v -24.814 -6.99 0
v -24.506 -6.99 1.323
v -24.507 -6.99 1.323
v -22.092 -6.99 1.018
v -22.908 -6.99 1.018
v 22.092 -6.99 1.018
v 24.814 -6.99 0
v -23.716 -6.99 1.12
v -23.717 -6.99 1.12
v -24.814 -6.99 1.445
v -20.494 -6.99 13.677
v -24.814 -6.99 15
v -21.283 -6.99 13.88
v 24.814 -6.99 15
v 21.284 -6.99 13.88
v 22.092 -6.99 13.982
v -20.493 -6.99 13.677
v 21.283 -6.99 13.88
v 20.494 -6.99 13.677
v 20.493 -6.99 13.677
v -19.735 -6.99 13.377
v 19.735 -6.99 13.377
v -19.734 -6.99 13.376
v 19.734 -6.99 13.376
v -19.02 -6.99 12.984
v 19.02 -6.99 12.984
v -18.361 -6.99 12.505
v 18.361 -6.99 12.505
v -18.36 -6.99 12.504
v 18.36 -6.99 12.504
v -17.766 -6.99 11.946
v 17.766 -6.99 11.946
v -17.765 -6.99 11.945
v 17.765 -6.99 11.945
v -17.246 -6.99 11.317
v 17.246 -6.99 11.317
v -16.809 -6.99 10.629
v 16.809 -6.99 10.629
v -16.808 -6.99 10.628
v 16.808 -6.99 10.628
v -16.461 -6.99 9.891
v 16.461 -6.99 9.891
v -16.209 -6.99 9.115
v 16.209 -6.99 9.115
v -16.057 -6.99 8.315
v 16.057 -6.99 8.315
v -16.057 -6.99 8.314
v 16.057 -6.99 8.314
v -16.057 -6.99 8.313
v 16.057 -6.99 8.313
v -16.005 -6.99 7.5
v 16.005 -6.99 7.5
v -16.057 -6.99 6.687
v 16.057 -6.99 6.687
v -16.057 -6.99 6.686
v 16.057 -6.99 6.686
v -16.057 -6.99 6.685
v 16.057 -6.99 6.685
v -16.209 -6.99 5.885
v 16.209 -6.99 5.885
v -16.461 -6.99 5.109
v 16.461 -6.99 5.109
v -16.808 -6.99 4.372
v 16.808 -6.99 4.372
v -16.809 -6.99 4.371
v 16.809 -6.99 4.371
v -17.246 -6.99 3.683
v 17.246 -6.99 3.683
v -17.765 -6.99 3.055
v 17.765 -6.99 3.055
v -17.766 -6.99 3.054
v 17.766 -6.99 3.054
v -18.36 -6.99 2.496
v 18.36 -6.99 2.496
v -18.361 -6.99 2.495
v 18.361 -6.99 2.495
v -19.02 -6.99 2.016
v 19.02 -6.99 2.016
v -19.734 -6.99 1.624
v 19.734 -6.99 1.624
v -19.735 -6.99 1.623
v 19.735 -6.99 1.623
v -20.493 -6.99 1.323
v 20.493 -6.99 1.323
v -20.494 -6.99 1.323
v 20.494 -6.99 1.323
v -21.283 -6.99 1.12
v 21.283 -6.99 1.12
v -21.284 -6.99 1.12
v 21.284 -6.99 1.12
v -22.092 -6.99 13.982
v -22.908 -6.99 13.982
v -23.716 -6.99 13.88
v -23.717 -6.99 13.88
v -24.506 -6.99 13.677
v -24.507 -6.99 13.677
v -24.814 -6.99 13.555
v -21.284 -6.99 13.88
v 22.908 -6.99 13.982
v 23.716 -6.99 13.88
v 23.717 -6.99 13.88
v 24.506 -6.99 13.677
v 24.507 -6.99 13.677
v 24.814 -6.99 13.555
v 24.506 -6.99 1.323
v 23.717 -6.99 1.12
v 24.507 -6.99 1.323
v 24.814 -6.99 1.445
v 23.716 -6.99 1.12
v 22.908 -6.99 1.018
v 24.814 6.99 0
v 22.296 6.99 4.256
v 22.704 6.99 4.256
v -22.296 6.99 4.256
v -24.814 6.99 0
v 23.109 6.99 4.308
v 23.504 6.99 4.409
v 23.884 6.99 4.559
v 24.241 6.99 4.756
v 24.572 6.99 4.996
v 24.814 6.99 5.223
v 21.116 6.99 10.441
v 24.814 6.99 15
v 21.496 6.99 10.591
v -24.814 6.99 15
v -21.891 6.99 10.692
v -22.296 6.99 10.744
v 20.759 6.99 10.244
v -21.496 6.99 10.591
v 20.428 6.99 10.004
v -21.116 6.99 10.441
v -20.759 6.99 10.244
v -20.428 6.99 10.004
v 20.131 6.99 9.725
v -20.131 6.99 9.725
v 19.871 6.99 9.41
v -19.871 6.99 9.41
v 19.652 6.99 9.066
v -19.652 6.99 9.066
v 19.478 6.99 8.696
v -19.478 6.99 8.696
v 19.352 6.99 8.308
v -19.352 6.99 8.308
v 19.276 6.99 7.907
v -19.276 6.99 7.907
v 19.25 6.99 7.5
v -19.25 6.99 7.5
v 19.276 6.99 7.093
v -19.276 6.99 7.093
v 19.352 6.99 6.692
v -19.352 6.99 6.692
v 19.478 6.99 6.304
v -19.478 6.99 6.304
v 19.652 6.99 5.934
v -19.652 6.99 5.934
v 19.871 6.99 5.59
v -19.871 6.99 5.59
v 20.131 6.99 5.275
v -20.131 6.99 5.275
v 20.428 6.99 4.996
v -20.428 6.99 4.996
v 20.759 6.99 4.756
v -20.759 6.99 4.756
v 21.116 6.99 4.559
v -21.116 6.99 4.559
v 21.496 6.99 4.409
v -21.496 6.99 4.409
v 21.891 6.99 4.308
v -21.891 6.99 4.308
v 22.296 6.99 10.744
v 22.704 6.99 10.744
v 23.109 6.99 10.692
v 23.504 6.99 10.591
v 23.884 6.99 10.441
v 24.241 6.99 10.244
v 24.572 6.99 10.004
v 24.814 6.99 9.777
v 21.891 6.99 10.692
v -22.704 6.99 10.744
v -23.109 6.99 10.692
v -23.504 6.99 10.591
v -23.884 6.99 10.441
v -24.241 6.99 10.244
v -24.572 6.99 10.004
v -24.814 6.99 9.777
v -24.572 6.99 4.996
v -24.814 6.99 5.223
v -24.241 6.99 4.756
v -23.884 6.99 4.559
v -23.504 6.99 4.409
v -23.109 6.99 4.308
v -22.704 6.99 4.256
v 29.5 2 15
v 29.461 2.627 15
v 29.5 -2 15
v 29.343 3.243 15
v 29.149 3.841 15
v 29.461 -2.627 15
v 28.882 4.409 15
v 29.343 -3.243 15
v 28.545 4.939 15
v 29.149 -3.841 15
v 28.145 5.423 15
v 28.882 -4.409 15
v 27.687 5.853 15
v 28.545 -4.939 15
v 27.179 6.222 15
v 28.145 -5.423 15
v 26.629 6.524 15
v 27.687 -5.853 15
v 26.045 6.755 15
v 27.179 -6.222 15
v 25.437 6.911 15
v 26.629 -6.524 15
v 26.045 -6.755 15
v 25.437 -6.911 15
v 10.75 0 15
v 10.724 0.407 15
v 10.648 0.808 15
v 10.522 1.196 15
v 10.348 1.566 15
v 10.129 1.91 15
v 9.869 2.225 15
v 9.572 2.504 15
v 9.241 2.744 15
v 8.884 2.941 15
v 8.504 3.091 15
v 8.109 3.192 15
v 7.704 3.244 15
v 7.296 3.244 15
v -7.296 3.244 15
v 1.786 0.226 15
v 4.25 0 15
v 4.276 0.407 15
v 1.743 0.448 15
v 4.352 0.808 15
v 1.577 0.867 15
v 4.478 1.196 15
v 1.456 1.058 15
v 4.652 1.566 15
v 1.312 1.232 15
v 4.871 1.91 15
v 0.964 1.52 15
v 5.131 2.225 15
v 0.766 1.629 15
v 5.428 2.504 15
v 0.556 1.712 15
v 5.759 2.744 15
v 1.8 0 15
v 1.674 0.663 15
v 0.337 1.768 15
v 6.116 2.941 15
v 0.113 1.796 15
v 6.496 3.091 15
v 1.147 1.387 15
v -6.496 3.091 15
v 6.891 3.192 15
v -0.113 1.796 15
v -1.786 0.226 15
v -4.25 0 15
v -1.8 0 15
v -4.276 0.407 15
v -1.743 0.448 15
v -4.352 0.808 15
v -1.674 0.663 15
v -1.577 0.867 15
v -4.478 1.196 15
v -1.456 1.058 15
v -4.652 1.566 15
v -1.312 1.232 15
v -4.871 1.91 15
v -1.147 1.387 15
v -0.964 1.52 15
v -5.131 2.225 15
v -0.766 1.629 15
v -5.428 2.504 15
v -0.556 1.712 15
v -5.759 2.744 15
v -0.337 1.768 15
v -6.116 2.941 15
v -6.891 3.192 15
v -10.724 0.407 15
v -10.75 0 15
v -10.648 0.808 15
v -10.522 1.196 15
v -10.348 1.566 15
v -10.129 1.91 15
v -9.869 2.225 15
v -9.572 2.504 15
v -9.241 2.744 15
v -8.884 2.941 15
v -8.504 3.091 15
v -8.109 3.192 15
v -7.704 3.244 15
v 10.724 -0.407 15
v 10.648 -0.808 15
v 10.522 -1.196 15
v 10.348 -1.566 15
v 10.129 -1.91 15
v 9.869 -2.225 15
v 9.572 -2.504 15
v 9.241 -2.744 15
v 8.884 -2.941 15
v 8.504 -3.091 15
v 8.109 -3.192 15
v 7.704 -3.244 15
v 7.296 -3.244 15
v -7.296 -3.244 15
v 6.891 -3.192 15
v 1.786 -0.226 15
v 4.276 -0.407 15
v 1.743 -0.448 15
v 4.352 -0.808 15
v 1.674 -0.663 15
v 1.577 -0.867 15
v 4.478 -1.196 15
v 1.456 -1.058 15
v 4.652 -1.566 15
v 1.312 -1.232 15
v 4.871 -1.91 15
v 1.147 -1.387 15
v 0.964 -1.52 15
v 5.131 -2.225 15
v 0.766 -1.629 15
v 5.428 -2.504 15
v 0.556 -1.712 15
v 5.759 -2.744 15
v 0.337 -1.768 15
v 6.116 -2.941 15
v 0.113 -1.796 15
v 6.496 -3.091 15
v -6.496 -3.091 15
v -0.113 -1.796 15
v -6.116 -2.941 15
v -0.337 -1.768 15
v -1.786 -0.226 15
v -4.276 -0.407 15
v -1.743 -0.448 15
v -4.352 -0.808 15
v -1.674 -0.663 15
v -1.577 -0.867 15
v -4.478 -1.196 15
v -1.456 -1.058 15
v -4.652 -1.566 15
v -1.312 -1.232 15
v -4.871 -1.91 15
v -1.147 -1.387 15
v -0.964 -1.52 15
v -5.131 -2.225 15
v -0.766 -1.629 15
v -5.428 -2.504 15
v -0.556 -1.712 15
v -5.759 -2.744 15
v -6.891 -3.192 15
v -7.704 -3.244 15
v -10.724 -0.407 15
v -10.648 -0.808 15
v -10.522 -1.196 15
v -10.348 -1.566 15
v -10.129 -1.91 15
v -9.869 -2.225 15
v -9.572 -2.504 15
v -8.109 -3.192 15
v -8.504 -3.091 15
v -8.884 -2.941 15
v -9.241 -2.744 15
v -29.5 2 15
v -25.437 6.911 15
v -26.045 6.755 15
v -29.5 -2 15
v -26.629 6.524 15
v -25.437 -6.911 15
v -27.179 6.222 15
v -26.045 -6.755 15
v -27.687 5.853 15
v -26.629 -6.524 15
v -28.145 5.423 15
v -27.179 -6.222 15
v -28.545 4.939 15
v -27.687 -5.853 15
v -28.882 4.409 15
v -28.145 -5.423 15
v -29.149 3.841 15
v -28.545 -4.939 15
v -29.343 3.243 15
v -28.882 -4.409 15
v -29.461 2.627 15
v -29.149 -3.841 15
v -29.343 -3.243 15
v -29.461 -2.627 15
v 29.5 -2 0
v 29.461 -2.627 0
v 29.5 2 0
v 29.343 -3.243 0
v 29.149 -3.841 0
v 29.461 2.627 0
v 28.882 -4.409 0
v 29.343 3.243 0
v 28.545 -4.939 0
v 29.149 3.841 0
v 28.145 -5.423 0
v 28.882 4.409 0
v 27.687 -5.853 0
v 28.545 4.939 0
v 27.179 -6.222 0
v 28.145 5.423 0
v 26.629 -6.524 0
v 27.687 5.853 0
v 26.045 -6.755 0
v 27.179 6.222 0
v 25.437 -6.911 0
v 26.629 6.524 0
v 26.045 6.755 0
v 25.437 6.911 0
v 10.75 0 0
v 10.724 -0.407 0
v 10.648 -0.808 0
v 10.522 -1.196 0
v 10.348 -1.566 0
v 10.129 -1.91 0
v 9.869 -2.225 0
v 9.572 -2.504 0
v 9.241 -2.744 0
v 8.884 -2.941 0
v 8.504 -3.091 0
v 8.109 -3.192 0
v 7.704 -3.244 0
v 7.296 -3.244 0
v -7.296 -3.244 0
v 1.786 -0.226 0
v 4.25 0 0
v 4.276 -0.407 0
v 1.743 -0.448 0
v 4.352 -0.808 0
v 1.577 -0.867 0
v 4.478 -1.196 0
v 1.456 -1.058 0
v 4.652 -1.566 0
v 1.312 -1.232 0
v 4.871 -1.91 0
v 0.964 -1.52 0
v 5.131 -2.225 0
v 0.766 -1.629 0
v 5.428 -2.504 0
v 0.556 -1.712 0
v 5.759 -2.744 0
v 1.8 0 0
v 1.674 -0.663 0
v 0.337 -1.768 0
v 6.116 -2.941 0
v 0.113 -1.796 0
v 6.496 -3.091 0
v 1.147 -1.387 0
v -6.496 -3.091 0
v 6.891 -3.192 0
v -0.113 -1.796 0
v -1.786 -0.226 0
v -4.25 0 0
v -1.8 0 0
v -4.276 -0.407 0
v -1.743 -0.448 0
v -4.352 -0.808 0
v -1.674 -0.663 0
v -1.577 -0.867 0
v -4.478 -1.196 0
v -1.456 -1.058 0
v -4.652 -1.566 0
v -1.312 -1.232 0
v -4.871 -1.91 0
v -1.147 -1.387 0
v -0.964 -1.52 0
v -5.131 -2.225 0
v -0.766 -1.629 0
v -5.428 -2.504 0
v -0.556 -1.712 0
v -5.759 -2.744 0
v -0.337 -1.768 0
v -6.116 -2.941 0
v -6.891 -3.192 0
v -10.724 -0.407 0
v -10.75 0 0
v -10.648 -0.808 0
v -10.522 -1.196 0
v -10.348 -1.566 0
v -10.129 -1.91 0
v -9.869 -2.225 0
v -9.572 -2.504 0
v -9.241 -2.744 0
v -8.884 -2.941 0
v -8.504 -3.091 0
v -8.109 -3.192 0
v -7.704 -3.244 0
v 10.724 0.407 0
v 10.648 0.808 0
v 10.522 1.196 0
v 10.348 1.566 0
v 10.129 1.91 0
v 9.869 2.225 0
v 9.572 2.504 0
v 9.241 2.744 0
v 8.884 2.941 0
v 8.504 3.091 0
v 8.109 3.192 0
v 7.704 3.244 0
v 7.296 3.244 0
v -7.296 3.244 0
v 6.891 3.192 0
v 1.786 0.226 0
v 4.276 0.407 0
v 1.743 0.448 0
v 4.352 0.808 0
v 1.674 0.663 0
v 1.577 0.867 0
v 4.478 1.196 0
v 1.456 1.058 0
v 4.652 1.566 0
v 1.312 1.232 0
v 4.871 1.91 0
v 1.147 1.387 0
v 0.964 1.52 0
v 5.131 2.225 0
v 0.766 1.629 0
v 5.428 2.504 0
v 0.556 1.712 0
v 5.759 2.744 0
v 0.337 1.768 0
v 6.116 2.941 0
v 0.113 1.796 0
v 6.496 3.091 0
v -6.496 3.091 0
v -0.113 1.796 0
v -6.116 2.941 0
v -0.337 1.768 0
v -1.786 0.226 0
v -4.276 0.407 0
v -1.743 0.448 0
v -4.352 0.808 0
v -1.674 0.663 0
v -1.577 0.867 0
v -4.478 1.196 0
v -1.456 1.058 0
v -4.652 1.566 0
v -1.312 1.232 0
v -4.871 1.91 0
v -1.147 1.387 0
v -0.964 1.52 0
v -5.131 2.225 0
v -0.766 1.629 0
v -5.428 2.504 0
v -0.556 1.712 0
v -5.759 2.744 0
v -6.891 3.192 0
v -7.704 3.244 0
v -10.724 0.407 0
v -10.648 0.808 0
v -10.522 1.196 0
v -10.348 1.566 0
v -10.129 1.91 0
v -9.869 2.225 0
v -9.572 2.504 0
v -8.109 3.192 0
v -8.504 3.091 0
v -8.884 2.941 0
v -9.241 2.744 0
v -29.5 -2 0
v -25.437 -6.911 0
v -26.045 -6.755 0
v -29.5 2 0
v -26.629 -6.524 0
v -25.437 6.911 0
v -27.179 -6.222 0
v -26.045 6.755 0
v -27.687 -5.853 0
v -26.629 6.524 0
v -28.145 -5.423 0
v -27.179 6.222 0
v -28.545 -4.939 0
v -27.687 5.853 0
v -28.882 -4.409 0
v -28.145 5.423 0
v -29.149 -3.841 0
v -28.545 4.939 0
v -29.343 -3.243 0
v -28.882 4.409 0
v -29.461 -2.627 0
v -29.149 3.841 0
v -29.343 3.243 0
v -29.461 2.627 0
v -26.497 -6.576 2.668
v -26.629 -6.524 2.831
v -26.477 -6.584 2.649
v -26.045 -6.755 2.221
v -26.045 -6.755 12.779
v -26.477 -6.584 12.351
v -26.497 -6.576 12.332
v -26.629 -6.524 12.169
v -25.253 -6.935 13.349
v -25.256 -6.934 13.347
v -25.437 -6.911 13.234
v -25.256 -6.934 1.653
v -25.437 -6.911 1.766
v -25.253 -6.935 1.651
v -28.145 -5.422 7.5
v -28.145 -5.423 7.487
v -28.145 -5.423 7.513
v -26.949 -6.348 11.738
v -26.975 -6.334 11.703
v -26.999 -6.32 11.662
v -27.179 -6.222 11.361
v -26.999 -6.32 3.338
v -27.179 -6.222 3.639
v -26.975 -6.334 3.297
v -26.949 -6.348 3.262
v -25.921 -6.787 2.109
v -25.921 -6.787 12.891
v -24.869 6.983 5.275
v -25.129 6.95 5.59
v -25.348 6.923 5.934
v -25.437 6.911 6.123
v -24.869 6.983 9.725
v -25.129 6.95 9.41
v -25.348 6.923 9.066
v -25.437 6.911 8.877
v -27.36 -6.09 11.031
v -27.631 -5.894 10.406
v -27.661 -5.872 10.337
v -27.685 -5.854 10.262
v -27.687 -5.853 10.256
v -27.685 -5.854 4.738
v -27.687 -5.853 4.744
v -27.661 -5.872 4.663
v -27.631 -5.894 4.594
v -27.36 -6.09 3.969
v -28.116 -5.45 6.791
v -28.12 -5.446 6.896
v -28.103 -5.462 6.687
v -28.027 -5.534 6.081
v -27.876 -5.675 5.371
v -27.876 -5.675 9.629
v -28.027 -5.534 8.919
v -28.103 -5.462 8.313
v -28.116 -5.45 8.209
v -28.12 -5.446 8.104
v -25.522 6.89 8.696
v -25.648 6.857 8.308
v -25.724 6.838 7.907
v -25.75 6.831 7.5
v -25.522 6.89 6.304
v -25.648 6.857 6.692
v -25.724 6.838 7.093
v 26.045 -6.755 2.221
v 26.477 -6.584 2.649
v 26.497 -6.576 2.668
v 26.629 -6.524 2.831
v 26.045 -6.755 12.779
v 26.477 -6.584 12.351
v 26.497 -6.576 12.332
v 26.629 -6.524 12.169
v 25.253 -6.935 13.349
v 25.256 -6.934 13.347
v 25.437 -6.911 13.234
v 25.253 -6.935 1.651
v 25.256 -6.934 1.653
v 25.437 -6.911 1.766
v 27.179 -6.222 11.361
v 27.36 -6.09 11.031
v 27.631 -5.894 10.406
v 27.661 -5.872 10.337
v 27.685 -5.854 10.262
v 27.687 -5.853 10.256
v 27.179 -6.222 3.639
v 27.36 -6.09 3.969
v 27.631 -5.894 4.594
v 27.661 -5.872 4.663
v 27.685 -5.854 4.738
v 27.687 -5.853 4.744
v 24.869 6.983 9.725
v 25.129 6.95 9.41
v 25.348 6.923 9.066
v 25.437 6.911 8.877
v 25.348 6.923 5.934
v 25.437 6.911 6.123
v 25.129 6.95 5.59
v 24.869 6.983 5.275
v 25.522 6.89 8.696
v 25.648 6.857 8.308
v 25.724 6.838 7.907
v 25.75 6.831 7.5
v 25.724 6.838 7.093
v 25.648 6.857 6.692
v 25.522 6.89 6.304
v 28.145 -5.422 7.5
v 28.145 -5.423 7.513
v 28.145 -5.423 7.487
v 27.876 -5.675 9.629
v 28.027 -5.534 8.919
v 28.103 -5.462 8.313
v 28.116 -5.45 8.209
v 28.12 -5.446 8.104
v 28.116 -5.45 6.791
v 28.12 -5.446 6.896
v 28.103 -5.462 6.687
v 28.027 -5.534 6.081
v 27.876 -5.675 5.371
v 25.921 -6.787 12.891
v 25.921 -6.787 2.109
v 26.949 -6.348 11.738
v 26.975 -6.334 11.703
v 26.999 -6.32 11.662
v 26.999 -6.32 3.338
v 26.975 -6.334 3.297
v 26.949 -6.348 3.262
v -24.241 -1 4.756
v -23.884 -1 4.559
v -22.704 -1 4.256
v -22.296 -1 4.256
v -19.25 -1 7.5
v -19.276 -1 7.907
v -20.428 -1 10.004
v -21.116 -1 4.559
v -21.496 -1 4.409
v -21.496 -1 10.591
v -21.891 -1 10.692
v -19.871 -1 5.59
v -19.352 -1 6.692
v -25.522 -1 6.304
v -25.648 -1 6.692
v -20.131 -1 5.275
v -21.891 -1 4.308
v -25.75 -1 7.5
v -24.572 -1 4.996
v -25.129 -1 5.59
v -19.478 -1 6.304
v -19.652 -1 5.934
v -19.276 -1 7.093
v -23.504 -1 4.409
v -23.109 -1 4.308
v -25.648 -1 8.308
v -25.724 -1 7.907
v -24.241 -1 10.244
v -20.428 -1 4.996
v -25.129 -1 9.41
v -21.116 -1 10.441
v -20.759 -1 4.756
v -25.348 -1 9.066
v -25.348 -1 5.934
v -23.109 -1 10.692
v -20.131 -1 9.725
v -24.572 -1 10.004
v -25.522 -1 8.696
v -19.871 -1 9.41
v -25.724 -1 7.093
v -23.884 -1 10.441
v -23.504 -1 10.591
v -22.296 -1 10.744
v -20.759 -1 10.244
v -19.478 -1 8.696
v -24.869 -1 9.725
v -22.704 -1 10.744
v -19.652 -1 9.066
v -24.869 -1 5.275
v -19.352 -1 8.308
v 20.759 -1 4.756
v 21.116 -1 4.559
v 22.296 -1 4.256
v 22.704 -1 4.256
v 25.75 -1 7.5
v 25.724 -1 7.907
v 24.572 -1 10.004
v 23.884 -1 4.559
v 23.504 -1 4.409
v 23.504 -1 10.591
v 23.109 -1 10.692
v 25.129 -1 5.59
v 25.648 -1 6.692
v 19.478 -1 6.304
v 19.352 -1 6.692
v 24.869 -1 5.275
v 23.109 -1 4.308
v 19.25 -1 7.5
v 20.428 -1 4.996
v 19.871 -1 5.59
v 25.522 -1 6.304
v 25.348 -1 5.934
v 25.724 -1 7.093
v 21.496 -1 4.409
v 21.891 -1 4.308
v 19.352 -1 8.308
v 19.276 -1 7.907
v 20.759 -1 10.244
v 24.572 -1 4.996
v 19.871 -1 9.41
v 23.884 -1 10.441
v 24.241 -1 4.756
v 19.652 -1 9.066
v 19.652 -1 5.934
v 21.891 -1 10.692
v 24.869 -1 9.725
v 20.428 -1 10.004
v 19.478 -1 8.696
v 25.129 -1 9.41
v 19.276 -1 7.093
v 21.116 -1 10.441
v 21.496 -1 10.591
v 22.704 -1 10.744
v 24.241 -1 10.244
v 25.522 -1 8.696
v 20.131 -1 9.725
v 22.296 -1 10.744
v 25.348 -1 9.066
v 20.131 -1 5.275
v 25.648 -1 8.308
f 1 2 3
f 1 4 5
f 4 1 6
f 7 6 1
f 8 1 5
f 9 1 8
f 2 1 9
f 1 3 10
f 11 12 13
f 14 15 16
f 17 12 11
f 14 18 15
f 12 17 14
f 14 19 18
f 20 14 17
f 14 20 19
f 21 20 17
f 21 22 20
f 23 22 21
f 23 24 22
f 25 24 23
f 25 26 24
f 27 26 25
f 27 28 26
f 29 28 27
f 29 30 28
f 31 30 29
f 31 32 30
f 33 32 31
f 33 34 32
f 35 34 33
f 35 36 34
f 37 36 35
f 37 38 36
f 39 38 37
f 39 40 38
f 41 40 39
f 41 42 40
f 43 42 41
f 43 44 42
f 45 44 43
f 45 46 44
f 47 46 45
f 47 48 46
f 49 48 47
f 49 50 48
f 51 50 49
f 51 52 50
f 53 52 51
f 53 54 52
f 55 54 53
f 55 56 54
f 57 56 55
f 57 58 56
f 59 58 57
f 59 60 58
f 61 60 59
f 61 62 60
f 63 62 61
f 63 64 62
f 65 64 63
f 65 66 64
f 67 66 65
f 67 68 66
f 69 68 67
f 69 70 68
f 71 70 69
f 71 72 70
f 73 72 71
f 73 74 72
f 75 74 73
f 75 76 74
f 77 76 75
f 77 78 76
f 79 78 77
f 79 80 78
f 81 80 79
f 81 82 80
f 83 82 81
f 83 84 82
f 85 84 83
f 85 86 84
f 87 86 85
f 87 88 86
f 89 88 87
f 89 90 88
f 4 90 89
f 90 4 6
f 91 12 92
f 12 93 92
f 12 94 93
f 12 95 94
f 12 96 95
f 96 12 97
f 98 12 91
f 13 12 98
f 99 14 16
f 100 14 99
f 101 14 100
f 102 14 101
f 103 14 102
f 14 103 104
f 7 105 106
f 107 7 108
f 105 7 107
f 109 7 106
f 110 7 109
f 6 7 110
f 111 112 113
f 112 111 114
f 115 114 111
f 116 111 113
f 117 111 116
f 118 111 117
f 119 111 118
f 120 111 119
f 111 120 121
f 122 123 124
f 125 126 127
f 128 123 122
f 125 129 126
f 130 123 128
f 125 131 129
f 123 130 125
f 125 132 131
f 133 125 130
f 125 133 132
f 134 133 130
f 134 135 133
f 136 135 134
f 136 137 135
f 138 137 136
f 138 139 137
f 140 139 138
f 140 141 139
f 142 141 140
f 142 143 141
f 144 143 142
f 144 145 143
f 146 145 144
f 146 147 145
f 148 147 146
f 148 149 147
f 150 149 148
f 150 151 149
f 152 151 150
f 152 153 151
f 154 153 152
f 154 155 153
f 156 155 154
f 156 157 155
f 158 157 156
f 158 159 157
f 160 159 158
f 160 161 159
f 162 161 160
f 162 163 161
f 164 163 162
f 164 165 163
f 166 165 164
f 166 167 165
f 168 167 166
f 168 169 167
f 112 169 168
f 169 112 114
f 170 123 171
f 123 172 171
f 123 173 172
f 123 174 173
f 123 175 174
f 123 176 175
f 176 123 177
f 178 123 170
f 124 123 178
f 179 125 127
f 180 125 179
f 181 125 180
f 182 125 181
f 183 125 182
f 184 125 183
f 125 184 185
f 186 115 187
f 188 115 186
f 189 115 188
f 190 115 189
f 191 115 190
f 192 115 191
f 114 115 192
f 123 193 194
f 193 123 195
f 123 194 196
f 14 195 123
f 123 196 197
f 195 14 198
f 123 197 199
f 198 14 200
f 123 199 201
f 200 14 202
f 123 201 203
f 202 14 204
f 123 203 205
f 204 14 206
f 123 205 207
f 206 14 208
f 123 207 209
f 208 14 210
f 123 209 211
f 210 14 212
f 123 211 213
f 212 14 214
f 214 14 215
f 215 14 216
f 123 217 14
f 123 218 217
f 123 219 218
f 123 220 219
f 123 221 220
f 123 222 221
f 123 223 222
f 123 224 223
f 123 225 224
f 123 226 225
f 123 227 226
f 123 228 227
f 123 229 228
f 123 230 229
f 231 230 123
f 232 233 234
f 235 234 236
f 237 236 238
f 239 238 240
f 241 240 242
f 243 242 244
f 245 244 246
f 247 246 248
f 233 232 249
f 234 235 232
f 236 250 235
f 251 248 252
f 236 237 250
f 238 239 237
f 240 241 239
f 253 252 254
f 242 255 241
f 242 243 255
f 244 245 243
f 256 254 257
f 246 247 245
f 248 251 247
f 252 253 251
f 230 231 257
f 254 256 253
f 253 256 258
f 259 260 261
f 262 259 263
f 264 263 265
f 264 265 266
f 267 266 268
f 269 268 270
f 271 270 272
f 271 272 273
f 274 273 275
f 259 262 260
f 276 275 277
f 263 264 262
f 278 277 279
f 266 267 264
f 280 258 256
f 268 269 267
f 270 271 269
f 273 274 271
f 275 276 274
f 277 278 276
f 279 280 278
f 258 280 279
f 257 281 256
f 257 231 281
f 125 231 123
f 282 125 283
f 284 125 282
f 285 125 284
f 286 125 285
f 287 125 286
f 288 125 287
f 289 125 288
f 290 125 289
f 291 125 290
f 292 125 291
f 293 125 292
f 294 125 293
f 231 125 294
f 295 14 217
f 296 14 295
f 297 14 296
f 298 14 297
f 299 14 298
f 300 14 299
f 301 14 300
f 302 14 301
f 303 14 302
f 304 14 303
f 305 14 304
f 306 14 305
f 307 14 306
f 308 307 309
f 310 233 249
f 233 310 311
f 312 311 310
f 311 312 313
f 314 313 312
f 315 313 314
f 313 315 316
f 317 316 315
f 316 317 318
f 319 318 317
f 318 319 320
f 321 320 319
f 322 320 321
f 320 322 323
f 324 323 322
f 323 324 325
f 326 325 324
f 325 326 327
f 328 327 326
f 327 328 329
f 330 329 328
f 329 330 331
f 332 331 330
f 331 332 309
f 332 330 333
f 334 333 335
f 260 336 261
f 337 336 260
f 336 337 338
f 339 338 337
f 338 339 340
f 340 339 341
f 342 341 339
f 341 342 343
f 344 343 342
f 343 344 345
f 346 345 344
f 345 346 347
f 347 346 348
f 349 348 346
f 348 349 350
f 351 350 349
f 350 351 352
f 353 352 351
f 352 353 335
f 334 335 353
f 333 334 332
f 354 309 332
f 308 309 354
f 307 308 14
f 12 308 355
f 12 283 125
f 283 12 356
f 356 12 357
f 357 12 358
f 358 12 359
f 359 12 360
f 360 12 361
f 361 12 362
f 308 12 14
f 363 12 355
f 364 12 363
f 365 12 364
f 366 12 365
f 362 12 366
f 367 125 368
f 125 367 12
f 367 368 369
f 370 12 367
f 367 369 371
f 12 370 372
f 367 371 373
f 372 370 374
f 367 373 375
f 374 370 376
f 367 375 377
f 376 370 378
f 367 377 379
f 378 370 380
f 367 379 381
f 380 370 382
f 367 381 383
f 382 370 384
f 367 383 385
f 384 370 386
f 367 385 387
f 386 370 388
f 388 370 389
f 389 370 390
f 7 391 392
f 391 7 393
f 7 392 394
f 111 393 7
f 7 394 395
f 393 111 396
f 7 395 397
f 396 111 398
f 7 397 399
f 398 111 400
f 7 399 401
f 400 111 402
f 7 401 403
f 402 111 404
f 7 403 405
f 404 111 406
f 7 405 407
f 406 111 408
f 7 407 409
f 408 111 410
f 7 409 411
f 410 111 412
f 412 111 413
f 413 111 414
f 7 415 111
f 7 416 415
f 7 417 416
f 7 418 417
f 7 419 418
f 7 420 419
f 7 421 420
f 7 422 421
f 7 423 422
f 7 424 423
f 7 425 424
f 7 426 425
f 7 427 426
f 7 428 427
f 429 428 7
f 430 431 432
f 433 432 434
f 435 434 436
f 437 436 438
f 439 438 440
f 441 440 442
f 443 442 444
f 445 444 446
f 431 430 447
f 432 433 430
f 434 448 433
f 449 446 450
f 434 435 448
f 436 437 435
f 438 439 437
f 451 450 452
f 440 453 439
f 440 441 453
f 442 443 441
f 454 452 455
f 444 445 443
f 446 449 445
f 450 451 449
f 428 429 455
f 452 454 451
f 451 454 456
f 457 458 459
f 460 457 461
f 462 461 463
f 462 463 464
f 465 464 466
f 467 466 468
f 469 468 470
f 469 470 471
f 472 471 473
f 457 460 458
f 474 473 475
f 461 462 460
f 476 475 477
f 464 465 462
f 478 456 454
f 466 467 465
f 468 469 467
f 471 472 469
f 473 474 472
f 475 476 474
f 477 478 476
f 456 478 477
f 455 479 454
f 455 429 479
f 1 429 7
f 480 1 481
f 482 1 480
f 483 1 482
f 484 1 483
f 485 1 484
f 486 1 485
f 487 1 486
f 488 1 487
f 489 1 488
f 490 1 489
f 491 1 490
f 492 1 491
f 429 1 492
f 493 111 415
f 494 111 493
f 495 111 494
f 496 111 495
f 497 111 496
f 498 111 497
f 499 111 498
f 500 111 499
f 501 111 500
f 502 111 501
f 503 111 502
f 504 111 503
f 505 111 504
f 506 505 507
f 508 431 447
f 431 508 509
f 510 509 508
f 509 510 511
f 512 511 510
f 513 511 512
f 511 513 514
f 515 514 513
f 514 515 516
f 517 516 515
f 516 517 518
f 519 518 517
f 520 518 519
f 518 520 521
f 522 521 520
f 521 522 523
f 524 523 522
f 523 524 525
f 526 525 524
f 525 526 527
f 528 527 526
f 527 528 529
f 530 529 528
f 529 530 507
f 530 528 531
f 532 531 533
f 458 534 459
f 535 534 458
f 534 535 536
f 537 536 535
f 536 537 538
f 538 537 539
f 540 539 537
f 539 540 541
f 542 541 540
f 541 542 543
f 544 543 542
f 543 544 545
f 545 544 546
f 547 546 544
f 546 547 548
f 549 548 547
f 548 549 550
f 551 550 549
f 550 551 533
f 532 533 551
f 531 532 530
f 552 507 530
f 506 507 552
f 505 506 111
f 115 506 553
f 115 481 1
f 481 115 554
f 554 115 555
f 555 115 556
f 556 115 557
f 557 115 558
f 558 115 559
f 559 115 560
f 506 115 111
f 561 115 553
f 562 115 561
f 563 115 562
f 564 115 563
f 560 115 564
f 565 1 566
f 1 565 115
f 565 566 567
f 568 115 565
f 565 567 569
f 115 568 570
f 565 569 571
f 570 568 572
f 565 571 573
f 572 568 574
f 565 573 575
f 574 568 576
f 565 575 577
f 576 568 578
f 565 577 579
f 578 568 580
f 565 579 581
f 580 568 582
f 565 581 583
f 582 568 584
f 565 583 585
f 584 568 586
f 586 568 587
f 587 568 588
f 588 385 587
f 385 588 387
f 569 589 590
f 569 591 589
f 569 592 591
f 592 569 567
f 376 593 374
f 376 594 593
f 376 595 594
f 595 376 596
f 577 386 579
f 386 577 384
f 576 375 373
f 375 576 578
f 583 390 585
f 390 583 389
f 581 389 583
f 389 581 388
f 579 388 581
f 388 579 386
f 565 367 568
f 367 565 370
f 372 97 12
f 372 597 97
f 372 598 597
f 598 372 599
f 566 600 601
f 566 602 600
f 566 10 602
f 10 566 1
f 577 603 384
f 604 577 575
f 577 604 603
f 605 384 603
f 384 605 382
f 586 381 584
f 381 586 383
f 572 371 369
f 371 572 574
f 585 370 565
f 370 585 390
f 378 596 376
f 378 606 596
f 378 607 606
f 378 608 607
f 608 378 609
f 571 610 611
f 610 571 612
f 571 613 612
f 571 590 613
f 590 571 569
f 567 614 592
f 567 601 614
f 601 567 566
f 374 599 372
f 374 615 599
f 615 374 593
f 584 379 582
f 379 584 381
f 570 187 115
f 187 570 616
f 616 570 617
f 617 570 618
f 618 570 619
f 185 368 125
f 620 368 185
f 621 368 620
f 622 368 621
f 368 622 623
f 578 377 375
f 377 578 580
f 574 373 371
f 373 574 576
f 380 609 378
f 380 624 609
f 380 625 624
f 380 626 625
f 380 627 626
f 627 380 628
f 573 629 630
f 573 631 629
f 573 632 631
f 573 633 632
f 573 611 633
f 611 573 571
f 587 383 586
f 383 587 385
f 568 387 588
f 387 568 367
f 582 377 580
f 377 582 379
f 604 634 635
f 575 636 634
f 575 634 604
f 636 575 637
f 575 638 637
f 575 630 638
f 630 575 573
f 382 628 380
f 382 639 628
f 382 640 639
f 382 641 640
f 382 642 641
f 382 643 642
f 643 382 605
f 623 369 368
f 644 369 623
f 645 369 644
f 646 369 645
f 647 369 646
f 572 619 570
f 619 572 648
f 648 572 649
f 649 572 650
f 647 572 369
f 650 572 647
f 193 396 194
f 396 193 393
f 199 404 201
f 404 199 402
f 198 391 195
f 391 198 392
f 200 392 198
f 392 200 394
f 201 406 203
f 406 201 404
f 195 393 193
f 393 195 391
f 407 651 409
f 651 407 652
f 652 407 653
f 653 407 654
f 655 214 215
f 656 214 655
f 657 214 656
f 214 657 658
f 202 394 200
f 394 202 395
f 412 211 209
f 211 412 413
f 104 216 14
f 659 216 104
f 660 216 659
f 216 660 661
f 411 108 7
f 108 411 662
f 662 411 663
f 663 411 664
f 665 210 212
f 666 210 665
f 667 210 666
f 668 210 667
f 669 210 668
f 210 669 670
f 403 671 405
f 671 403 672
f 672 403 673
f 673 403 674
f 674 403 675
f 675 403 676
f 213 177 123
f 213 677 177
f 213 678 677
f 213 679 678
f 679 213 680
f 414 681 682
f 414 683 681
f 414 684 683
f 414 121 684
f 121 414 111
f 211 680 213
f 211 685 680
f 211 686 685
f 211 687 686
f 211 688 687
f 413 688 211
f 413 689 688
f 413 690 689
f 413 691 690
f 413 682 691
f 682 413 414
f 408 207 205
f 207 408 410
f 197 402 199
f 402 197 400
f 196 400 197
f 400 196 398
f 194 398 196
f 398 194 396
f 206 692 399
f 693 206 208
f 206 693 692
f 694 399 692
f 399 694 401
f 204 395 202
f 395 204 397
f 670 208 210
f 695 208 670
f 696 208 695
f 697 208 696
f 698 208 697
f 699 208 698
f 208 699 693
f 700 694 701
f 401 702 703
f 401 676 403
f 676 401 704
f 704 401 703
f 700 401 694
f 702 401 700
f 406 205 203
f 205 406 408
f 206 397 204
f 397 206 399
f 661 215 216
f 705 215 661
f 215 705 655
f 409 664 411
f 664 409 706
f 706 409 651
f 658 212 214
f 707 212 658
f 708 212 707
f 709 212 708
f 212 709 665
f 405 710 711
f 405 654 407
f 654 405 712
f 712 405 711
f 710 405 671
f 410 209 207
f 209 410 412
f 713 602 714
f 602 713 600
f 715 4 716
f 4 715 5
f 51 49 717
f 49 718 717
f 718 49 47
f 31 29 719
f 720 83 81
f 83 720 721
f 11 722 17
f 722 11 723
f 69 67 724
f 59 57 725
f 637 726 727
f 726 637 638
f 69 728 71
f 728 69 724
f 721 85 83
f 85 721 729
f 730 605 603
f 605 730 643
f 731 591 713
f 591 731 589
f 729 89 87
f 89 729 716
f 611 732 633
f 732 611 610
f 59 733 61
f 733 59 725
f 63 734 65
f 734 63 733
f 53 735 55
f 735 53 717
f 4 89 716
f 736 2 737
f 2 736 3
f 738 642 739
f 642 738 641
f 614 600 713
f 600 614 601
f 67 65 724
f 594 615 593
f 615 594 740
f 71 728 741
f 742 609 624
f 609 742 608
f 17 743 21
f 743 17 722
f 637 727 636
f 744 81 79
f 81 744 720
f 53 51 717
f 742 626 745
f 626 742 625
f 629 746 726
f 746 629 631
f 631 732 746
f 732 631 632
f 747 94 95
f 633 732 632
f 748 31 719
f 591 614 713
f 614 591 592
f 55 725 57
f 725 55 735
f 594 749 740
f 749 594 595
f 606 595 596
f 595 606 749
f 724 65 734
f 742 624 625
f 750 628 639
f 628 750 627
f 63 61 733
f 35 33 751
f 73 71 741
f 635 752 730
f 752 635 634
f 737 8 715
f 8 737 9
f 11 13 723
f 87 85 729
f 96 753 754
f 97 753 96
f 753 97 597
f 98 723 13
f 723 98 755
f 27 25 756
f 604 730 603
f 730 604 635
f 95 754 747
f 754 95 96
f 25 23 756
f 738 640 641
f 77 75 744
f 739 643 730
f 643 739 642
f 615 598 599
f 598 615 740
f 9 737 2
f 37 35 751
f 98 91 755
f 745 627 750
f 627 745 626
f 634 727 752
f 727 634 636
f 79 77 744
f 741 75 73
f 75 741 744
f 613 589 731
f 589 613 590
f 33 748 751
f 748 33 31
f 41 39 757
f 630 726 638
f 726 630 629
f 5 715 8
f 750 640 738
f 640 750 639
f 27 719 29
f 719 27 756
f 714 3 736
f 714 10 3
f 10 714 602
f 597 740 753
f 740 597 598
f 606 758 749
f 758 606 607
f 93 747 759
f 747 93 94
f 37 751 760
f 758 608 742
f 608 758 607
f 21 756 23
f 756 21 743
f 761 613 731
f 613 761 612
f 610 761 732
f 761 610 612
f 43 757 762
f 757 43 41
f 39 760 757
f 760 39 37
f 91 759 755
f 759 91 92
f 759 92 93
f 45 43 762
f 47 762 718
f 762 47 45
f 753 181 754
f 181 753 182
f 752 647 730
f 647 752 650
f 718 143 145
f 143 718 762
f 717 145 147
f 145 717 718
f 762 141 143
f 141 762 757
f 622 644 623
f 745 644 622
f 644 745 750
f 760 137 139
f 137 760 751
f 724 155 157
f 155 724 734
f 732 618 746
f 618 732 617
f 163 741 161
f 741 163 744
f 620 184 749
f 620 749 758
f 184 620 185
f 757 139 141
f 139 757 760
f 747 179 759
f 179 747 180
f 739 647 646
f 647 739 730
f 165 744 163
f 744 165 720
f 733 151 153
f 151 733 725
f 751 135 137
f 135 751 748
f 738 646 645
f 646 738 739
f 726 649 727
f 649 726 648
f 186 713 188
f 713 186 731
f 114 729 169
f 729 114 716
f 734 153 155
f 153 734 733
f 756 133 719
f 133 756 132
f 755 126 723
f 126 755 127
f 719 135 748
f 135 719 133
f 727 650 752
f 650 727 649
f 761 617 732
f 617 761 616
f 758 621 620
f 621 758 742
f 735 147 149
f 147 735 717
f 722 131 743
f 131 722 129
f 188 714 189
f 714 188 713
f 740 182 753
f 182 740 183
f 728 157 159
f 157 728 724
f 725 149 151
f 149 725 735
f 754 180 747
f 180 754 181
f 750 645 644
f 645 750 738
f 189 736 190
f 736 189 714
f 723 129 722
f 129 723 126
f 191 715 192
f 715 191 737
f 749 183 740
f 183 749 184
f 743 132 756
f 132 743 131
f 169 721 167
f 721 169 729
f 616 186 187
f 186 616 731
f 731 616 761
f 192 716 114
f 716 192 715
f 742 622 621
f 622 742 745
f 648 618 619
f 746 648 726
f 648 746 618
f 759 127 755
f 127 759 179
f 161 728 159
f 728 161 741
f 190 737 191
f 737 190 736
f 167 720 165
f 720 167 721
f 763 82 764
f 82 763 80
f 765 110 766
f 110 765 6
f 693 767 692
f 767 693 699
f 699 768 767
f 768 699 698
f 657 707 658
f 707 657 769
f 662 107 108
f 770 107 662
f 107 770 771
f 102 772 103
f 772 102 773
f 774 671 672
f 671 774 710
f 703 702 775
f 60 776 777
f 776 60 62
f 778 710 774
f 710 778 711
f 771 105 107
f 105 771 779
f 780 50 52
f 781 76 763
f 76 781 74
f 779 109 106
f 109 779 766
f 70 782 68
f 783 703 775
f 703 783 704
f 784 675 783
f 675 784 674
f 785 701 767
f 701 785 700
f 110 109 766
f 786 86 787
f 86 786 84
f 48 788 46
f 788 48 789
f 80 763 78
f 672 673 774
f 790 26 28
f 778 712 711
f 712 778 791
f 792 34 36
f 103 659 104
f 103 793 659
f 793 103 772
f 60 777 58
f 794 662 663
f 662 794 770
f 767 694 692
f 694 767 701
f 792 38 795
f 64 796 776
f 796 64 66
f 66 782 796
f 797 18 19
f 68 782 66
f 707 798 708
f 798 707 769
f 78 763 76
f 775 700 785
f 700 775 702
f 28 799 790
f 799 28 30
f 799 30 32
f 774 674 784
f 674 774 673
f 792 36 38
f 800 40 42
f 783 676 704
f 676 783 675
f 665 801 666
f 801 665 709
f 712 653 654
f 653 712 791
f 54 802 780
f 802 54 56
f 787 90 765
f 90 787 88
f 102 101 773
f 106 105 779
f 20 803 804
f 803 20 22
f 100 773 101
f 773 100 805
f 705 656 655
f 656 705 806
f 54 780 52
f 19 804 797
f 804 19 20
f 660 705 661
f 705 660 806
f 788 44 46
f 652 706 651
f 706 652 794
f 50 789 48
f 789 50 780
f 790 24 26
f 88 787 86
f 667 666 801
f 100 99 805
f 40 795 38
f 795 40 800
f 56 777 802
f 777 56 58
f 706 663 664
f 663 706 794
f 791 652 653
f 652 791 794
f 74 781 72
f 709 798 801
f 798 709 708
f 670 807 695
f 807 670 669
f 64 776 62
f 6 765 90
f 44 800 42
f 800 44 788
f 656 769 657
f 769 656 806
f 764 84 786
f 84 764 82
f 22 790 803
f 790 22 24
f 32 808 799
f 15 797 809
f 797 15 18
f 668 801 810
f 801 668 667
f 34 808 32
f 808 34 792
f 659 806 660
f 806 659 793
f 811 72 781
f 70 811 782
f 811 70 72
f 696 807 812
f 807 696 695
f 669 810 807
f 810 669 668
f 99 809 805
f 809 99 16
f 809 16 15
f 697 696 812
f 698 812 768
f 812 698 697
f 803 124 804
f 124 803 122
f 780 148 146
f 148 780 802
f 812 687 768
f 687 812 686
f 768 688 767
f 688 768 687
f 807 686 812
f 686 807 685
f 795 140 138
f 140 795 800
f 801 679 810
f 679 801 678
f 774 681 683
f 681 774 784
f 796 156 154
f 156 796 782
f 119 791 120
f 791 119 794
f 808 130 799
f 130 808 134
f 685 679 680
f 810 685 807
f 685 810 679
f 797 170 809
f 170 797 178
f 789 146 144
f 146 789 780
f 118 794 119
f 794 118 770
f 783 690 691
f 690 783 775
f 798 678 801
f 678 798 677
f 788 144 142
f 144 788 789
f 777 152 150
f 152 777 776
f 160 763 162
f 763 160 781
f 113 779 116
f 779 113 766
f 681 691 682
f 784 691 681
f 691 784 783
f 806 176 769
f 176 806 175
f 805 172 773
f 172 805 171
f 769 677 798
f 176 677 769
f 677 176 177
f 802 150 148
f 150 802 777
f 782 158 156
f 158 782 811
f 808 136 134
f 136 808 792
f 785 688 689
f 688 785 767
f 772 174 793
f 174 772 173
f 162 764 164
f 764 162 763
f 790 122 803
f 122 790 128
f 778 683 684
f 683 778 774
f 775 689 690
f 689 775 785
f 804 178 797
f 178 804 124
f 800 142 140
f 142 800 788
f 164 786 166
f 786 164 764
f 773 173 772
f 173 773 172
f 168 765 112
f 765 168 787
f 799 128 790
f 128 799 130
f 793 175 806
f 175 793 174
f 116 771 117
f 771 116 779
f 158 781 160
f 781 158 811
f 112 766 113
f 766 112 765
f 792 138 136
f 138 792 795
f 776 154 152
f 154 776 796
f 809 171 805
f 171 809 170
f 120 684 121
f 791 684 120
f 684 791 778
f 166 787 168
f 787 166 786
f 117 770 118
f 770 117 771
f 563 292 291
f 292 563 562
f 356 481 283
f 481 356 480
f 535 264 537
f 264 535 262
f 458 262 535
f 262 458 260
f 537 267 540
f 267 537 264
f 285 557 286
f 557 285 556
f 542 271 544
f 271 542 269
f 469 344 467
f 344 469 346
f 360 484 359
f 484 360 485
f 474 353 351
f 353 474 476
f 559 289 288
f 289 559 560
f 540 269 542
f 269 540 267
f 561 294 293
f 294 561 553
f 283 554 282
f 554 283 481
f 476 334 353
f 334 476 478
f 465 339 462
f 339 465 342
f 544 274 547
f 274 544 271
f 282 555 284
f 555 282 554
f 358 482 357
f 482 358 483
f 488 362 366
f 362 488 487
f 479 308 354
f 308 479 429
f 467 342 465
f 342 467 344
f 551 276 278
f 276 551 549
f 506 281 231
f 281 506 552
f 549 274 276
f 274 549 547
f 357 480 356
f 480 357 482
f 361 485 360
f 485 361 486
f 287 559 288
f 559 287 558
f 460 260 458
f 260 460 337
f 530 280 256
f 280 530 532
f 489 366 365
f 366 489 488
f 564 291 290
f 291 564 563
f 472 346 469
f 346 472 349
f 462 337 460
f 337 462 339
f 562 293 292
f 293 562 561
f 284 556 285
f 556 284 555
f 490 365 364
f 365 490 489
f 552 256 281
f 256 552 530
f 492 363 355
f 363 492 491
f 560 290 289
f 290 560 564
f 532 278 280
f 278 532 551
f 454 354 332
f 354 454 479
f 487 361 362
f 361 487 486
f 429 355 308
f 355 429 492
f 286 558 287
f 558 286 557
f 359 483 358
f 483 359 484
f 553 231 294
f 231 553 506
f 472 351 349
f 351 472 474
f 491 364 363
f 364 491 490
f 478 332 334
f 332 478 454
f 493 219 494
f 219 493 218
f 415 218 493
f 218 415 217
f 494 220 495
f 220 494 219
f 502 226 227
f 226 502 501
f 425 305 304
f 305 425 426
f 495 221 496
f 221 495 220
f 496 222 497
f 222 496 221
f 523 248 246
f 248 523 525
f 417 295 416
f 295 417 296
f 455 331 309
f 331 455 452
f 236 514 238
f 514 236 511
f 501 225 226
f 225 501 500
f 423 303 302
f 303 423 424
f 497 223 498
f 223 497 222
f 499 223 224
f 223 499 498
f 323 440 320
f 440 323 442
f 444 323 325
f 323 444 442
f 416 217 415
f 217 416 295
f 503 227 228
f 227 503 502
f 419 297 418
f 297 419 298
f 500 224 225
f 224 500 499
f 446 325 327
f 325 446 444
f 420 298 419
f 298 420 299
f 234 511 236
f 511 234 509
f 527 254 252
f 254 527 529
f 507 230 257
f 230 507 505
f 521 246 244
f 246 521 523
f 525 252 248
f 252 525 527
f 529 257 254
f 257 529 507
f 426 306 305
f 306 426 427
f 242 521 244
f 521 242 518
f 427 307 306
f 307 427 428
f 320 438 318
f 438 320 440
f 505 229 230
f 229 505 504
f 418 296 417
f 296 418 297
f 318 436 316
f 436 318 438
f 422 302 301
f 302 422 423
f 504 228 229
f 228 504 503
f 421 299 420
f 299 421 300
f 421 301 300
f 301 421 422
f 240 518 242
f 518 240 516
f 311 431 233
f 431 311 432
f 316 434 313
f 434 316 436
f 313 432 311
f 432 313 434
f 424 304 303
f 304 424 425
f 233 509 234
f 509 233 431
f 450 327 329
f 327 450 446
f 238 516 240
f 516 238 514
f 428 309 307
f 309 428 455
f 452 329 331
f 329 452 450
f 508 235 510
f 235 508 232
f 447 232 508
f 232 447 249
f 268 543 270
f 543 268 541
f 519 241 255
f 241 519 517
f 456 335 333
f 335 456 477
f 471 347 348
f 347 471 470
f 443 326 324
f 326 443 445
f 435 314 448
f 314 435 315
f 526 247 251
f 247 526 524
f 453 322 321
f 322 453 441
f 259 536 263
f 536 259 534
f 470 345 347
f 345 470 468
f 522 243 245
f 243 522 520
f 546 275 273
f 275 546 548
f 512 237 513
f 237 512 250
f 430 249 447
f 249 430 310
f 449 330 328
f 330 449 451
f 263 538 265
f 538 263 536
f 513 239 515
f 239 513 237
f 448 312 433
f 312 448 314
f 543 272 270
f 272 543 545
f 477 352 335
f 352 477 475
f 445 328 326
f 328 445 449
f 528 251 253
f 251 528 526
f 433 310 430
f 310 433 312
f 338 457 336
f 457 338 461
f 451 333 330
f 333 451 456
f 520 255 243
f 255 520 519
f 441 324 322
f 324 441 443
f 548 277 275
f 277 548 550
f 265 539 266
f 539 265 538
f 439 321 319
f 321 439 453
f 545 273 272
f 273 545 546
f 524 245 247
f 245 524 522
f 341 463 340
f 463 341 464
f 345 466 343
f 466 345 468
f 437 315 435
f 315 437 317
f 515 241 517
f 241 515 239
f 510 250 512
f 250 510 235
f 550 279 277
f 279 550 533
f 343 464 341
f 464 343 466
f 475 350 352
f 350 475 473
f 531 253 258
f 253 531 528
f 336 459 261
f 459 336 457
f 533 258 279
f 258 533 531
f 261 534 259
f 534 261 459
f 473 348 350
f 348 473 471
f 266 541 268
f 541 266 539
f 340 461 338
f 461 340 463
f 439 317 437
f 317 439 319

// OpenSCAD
$fn = 50;


difference() {
	union() {
		hull() {
			translate(v = [-9.5000000000, 2.0000000000, 0]) {
				cylinder(h = 15, r = 5);
			}
			translate(v = [9.5000000000, 2.0000000000, 0]) {
				cylinder(h = 15, r = 5);
			}
			translate(v = [-9.5000000000, -2.0000000000, 0]) {
				cylinder(h = 15, r = 5);
			}
			translate(v = [9.5000000000, -2.0000000000, 0]) {
				cylinder(h = 15, r = 5);
			}
		}
		translate(v = [-15.0000000000, 0.0000000000, 0]) {
			hull() {
				translate(v = [-9.5000000000, 2.0000000000, 0]) {
					cylinder(h = 15, r = 5);
				}
				translate(v = [9.5000000000, 2.0000000000, 0]) {
					cylinder(h = 15, r = 5);
				}
				translate(v = [-9.5000000000, -2.0000000000, 0]) {
					cylinder(h = 15, r = 5);
				}
				translate(v = [9.5000000000, -2.0000000000, 0]) {
					cylinder(h = 15, r = 5);
				}
			}
		}
		translate(v = [15.0000000000, 0.0000000000, 0]) {
			hull() {
				translate(v = [-9.5000000000, 2.0000000000, 0]) {
					cylinder(h = 15, r = 5);
				}
				translate(v = [9.5000000000, 2.0000000000, 0]) {
					cylinder(h = 15, r = 5);
				}
				translate(v = [-9.5000000000, -2.0000000000, 0]) {
					cylinder(h = 15, r = 5);
				}
				translate(v = [9.5000000000, -2.0000000000, 0]) {
					cylinder(h = 15, r = 5);
				}
			}
		}
	}
	union() {
		translate(v = [-22.5000000000, -7.0000000000, 7.5000000000]) {
			rotate(a = [90, 0, 0]) {
				difference() {
					union() {
						#translate(v = [0, 0, -14.0000000000]) {
							cylinder(h = 14, r = 2.2500000000);
						}
						#translate(v = [0, 0, -6]) {
							cylinder(h = 6, r1 = 3.2500000000, r2 = 6.5000000000);
						}
						#translate(v = [0, 0, -14.0000000000]) {
							cylinder(h = 14, r = 3.2500000000);
						}
						#translate(v = [0, 0, -14.0000000000]) {
							cylinder(h = 14, r = 2.2500000000);
						}
					}
					union();
				}
			}
		}
		translate(v = [22.5000000000, -7.0000000000, 7.5000000000]) {
			rotate(a = [90, 0, 0]) {
				difference() {
					union() {
						#translate(v = [0, 0, -14.0000000000]) {
							cylinder(h = 14, r = 2.2500000000);
						}
						#translate(v = [0, 0, -6]) {
							cylinder(h = 6, r1 = 3.2500000000, r2 = 6.5000000000);
						}
						#translate(v = [0, 0, -14.0000000000]) {
							cylinder(h = 14, r = 3.2500000000);
						}
						#translate(v = [0, 0, -14.0000000000]) {
							cylinder(h = 14, r = 2.2500000000);
						}
					}
					union();
				}
			}
		}
		translate(v = [-7.5000000000, 0.0000000000, 0]) {
			translate(v = [0, 0, -100]) {
				cylinder(h = 200, r = 3.2500000000);
			}
		}
		translate(v = [7.5000000000, 0.0000000000, 0]) {
			translate(v = [0, 0, -100]) {
				cylinder(h = 200, r = 3.2500000000);
			}
		}
		translate(v = [-7.5000000000, 0.0000000000, 0]) {
			translate(v = [0, 0, -100]) {
				cylinder(h = 200, r = 1.8000000000);
			}
		}
		translate(v = [0, 0, -100]) {
			cylinder(h = 200, r = 1.8000000000);
		}
		translate(v = [7.5000000000, 0.0000000000, 0]) {
			translate(v = [0, 0, -100]) {
				cylinder(h = 200, r = 1.8000000000);
			}
		}
	}
}
